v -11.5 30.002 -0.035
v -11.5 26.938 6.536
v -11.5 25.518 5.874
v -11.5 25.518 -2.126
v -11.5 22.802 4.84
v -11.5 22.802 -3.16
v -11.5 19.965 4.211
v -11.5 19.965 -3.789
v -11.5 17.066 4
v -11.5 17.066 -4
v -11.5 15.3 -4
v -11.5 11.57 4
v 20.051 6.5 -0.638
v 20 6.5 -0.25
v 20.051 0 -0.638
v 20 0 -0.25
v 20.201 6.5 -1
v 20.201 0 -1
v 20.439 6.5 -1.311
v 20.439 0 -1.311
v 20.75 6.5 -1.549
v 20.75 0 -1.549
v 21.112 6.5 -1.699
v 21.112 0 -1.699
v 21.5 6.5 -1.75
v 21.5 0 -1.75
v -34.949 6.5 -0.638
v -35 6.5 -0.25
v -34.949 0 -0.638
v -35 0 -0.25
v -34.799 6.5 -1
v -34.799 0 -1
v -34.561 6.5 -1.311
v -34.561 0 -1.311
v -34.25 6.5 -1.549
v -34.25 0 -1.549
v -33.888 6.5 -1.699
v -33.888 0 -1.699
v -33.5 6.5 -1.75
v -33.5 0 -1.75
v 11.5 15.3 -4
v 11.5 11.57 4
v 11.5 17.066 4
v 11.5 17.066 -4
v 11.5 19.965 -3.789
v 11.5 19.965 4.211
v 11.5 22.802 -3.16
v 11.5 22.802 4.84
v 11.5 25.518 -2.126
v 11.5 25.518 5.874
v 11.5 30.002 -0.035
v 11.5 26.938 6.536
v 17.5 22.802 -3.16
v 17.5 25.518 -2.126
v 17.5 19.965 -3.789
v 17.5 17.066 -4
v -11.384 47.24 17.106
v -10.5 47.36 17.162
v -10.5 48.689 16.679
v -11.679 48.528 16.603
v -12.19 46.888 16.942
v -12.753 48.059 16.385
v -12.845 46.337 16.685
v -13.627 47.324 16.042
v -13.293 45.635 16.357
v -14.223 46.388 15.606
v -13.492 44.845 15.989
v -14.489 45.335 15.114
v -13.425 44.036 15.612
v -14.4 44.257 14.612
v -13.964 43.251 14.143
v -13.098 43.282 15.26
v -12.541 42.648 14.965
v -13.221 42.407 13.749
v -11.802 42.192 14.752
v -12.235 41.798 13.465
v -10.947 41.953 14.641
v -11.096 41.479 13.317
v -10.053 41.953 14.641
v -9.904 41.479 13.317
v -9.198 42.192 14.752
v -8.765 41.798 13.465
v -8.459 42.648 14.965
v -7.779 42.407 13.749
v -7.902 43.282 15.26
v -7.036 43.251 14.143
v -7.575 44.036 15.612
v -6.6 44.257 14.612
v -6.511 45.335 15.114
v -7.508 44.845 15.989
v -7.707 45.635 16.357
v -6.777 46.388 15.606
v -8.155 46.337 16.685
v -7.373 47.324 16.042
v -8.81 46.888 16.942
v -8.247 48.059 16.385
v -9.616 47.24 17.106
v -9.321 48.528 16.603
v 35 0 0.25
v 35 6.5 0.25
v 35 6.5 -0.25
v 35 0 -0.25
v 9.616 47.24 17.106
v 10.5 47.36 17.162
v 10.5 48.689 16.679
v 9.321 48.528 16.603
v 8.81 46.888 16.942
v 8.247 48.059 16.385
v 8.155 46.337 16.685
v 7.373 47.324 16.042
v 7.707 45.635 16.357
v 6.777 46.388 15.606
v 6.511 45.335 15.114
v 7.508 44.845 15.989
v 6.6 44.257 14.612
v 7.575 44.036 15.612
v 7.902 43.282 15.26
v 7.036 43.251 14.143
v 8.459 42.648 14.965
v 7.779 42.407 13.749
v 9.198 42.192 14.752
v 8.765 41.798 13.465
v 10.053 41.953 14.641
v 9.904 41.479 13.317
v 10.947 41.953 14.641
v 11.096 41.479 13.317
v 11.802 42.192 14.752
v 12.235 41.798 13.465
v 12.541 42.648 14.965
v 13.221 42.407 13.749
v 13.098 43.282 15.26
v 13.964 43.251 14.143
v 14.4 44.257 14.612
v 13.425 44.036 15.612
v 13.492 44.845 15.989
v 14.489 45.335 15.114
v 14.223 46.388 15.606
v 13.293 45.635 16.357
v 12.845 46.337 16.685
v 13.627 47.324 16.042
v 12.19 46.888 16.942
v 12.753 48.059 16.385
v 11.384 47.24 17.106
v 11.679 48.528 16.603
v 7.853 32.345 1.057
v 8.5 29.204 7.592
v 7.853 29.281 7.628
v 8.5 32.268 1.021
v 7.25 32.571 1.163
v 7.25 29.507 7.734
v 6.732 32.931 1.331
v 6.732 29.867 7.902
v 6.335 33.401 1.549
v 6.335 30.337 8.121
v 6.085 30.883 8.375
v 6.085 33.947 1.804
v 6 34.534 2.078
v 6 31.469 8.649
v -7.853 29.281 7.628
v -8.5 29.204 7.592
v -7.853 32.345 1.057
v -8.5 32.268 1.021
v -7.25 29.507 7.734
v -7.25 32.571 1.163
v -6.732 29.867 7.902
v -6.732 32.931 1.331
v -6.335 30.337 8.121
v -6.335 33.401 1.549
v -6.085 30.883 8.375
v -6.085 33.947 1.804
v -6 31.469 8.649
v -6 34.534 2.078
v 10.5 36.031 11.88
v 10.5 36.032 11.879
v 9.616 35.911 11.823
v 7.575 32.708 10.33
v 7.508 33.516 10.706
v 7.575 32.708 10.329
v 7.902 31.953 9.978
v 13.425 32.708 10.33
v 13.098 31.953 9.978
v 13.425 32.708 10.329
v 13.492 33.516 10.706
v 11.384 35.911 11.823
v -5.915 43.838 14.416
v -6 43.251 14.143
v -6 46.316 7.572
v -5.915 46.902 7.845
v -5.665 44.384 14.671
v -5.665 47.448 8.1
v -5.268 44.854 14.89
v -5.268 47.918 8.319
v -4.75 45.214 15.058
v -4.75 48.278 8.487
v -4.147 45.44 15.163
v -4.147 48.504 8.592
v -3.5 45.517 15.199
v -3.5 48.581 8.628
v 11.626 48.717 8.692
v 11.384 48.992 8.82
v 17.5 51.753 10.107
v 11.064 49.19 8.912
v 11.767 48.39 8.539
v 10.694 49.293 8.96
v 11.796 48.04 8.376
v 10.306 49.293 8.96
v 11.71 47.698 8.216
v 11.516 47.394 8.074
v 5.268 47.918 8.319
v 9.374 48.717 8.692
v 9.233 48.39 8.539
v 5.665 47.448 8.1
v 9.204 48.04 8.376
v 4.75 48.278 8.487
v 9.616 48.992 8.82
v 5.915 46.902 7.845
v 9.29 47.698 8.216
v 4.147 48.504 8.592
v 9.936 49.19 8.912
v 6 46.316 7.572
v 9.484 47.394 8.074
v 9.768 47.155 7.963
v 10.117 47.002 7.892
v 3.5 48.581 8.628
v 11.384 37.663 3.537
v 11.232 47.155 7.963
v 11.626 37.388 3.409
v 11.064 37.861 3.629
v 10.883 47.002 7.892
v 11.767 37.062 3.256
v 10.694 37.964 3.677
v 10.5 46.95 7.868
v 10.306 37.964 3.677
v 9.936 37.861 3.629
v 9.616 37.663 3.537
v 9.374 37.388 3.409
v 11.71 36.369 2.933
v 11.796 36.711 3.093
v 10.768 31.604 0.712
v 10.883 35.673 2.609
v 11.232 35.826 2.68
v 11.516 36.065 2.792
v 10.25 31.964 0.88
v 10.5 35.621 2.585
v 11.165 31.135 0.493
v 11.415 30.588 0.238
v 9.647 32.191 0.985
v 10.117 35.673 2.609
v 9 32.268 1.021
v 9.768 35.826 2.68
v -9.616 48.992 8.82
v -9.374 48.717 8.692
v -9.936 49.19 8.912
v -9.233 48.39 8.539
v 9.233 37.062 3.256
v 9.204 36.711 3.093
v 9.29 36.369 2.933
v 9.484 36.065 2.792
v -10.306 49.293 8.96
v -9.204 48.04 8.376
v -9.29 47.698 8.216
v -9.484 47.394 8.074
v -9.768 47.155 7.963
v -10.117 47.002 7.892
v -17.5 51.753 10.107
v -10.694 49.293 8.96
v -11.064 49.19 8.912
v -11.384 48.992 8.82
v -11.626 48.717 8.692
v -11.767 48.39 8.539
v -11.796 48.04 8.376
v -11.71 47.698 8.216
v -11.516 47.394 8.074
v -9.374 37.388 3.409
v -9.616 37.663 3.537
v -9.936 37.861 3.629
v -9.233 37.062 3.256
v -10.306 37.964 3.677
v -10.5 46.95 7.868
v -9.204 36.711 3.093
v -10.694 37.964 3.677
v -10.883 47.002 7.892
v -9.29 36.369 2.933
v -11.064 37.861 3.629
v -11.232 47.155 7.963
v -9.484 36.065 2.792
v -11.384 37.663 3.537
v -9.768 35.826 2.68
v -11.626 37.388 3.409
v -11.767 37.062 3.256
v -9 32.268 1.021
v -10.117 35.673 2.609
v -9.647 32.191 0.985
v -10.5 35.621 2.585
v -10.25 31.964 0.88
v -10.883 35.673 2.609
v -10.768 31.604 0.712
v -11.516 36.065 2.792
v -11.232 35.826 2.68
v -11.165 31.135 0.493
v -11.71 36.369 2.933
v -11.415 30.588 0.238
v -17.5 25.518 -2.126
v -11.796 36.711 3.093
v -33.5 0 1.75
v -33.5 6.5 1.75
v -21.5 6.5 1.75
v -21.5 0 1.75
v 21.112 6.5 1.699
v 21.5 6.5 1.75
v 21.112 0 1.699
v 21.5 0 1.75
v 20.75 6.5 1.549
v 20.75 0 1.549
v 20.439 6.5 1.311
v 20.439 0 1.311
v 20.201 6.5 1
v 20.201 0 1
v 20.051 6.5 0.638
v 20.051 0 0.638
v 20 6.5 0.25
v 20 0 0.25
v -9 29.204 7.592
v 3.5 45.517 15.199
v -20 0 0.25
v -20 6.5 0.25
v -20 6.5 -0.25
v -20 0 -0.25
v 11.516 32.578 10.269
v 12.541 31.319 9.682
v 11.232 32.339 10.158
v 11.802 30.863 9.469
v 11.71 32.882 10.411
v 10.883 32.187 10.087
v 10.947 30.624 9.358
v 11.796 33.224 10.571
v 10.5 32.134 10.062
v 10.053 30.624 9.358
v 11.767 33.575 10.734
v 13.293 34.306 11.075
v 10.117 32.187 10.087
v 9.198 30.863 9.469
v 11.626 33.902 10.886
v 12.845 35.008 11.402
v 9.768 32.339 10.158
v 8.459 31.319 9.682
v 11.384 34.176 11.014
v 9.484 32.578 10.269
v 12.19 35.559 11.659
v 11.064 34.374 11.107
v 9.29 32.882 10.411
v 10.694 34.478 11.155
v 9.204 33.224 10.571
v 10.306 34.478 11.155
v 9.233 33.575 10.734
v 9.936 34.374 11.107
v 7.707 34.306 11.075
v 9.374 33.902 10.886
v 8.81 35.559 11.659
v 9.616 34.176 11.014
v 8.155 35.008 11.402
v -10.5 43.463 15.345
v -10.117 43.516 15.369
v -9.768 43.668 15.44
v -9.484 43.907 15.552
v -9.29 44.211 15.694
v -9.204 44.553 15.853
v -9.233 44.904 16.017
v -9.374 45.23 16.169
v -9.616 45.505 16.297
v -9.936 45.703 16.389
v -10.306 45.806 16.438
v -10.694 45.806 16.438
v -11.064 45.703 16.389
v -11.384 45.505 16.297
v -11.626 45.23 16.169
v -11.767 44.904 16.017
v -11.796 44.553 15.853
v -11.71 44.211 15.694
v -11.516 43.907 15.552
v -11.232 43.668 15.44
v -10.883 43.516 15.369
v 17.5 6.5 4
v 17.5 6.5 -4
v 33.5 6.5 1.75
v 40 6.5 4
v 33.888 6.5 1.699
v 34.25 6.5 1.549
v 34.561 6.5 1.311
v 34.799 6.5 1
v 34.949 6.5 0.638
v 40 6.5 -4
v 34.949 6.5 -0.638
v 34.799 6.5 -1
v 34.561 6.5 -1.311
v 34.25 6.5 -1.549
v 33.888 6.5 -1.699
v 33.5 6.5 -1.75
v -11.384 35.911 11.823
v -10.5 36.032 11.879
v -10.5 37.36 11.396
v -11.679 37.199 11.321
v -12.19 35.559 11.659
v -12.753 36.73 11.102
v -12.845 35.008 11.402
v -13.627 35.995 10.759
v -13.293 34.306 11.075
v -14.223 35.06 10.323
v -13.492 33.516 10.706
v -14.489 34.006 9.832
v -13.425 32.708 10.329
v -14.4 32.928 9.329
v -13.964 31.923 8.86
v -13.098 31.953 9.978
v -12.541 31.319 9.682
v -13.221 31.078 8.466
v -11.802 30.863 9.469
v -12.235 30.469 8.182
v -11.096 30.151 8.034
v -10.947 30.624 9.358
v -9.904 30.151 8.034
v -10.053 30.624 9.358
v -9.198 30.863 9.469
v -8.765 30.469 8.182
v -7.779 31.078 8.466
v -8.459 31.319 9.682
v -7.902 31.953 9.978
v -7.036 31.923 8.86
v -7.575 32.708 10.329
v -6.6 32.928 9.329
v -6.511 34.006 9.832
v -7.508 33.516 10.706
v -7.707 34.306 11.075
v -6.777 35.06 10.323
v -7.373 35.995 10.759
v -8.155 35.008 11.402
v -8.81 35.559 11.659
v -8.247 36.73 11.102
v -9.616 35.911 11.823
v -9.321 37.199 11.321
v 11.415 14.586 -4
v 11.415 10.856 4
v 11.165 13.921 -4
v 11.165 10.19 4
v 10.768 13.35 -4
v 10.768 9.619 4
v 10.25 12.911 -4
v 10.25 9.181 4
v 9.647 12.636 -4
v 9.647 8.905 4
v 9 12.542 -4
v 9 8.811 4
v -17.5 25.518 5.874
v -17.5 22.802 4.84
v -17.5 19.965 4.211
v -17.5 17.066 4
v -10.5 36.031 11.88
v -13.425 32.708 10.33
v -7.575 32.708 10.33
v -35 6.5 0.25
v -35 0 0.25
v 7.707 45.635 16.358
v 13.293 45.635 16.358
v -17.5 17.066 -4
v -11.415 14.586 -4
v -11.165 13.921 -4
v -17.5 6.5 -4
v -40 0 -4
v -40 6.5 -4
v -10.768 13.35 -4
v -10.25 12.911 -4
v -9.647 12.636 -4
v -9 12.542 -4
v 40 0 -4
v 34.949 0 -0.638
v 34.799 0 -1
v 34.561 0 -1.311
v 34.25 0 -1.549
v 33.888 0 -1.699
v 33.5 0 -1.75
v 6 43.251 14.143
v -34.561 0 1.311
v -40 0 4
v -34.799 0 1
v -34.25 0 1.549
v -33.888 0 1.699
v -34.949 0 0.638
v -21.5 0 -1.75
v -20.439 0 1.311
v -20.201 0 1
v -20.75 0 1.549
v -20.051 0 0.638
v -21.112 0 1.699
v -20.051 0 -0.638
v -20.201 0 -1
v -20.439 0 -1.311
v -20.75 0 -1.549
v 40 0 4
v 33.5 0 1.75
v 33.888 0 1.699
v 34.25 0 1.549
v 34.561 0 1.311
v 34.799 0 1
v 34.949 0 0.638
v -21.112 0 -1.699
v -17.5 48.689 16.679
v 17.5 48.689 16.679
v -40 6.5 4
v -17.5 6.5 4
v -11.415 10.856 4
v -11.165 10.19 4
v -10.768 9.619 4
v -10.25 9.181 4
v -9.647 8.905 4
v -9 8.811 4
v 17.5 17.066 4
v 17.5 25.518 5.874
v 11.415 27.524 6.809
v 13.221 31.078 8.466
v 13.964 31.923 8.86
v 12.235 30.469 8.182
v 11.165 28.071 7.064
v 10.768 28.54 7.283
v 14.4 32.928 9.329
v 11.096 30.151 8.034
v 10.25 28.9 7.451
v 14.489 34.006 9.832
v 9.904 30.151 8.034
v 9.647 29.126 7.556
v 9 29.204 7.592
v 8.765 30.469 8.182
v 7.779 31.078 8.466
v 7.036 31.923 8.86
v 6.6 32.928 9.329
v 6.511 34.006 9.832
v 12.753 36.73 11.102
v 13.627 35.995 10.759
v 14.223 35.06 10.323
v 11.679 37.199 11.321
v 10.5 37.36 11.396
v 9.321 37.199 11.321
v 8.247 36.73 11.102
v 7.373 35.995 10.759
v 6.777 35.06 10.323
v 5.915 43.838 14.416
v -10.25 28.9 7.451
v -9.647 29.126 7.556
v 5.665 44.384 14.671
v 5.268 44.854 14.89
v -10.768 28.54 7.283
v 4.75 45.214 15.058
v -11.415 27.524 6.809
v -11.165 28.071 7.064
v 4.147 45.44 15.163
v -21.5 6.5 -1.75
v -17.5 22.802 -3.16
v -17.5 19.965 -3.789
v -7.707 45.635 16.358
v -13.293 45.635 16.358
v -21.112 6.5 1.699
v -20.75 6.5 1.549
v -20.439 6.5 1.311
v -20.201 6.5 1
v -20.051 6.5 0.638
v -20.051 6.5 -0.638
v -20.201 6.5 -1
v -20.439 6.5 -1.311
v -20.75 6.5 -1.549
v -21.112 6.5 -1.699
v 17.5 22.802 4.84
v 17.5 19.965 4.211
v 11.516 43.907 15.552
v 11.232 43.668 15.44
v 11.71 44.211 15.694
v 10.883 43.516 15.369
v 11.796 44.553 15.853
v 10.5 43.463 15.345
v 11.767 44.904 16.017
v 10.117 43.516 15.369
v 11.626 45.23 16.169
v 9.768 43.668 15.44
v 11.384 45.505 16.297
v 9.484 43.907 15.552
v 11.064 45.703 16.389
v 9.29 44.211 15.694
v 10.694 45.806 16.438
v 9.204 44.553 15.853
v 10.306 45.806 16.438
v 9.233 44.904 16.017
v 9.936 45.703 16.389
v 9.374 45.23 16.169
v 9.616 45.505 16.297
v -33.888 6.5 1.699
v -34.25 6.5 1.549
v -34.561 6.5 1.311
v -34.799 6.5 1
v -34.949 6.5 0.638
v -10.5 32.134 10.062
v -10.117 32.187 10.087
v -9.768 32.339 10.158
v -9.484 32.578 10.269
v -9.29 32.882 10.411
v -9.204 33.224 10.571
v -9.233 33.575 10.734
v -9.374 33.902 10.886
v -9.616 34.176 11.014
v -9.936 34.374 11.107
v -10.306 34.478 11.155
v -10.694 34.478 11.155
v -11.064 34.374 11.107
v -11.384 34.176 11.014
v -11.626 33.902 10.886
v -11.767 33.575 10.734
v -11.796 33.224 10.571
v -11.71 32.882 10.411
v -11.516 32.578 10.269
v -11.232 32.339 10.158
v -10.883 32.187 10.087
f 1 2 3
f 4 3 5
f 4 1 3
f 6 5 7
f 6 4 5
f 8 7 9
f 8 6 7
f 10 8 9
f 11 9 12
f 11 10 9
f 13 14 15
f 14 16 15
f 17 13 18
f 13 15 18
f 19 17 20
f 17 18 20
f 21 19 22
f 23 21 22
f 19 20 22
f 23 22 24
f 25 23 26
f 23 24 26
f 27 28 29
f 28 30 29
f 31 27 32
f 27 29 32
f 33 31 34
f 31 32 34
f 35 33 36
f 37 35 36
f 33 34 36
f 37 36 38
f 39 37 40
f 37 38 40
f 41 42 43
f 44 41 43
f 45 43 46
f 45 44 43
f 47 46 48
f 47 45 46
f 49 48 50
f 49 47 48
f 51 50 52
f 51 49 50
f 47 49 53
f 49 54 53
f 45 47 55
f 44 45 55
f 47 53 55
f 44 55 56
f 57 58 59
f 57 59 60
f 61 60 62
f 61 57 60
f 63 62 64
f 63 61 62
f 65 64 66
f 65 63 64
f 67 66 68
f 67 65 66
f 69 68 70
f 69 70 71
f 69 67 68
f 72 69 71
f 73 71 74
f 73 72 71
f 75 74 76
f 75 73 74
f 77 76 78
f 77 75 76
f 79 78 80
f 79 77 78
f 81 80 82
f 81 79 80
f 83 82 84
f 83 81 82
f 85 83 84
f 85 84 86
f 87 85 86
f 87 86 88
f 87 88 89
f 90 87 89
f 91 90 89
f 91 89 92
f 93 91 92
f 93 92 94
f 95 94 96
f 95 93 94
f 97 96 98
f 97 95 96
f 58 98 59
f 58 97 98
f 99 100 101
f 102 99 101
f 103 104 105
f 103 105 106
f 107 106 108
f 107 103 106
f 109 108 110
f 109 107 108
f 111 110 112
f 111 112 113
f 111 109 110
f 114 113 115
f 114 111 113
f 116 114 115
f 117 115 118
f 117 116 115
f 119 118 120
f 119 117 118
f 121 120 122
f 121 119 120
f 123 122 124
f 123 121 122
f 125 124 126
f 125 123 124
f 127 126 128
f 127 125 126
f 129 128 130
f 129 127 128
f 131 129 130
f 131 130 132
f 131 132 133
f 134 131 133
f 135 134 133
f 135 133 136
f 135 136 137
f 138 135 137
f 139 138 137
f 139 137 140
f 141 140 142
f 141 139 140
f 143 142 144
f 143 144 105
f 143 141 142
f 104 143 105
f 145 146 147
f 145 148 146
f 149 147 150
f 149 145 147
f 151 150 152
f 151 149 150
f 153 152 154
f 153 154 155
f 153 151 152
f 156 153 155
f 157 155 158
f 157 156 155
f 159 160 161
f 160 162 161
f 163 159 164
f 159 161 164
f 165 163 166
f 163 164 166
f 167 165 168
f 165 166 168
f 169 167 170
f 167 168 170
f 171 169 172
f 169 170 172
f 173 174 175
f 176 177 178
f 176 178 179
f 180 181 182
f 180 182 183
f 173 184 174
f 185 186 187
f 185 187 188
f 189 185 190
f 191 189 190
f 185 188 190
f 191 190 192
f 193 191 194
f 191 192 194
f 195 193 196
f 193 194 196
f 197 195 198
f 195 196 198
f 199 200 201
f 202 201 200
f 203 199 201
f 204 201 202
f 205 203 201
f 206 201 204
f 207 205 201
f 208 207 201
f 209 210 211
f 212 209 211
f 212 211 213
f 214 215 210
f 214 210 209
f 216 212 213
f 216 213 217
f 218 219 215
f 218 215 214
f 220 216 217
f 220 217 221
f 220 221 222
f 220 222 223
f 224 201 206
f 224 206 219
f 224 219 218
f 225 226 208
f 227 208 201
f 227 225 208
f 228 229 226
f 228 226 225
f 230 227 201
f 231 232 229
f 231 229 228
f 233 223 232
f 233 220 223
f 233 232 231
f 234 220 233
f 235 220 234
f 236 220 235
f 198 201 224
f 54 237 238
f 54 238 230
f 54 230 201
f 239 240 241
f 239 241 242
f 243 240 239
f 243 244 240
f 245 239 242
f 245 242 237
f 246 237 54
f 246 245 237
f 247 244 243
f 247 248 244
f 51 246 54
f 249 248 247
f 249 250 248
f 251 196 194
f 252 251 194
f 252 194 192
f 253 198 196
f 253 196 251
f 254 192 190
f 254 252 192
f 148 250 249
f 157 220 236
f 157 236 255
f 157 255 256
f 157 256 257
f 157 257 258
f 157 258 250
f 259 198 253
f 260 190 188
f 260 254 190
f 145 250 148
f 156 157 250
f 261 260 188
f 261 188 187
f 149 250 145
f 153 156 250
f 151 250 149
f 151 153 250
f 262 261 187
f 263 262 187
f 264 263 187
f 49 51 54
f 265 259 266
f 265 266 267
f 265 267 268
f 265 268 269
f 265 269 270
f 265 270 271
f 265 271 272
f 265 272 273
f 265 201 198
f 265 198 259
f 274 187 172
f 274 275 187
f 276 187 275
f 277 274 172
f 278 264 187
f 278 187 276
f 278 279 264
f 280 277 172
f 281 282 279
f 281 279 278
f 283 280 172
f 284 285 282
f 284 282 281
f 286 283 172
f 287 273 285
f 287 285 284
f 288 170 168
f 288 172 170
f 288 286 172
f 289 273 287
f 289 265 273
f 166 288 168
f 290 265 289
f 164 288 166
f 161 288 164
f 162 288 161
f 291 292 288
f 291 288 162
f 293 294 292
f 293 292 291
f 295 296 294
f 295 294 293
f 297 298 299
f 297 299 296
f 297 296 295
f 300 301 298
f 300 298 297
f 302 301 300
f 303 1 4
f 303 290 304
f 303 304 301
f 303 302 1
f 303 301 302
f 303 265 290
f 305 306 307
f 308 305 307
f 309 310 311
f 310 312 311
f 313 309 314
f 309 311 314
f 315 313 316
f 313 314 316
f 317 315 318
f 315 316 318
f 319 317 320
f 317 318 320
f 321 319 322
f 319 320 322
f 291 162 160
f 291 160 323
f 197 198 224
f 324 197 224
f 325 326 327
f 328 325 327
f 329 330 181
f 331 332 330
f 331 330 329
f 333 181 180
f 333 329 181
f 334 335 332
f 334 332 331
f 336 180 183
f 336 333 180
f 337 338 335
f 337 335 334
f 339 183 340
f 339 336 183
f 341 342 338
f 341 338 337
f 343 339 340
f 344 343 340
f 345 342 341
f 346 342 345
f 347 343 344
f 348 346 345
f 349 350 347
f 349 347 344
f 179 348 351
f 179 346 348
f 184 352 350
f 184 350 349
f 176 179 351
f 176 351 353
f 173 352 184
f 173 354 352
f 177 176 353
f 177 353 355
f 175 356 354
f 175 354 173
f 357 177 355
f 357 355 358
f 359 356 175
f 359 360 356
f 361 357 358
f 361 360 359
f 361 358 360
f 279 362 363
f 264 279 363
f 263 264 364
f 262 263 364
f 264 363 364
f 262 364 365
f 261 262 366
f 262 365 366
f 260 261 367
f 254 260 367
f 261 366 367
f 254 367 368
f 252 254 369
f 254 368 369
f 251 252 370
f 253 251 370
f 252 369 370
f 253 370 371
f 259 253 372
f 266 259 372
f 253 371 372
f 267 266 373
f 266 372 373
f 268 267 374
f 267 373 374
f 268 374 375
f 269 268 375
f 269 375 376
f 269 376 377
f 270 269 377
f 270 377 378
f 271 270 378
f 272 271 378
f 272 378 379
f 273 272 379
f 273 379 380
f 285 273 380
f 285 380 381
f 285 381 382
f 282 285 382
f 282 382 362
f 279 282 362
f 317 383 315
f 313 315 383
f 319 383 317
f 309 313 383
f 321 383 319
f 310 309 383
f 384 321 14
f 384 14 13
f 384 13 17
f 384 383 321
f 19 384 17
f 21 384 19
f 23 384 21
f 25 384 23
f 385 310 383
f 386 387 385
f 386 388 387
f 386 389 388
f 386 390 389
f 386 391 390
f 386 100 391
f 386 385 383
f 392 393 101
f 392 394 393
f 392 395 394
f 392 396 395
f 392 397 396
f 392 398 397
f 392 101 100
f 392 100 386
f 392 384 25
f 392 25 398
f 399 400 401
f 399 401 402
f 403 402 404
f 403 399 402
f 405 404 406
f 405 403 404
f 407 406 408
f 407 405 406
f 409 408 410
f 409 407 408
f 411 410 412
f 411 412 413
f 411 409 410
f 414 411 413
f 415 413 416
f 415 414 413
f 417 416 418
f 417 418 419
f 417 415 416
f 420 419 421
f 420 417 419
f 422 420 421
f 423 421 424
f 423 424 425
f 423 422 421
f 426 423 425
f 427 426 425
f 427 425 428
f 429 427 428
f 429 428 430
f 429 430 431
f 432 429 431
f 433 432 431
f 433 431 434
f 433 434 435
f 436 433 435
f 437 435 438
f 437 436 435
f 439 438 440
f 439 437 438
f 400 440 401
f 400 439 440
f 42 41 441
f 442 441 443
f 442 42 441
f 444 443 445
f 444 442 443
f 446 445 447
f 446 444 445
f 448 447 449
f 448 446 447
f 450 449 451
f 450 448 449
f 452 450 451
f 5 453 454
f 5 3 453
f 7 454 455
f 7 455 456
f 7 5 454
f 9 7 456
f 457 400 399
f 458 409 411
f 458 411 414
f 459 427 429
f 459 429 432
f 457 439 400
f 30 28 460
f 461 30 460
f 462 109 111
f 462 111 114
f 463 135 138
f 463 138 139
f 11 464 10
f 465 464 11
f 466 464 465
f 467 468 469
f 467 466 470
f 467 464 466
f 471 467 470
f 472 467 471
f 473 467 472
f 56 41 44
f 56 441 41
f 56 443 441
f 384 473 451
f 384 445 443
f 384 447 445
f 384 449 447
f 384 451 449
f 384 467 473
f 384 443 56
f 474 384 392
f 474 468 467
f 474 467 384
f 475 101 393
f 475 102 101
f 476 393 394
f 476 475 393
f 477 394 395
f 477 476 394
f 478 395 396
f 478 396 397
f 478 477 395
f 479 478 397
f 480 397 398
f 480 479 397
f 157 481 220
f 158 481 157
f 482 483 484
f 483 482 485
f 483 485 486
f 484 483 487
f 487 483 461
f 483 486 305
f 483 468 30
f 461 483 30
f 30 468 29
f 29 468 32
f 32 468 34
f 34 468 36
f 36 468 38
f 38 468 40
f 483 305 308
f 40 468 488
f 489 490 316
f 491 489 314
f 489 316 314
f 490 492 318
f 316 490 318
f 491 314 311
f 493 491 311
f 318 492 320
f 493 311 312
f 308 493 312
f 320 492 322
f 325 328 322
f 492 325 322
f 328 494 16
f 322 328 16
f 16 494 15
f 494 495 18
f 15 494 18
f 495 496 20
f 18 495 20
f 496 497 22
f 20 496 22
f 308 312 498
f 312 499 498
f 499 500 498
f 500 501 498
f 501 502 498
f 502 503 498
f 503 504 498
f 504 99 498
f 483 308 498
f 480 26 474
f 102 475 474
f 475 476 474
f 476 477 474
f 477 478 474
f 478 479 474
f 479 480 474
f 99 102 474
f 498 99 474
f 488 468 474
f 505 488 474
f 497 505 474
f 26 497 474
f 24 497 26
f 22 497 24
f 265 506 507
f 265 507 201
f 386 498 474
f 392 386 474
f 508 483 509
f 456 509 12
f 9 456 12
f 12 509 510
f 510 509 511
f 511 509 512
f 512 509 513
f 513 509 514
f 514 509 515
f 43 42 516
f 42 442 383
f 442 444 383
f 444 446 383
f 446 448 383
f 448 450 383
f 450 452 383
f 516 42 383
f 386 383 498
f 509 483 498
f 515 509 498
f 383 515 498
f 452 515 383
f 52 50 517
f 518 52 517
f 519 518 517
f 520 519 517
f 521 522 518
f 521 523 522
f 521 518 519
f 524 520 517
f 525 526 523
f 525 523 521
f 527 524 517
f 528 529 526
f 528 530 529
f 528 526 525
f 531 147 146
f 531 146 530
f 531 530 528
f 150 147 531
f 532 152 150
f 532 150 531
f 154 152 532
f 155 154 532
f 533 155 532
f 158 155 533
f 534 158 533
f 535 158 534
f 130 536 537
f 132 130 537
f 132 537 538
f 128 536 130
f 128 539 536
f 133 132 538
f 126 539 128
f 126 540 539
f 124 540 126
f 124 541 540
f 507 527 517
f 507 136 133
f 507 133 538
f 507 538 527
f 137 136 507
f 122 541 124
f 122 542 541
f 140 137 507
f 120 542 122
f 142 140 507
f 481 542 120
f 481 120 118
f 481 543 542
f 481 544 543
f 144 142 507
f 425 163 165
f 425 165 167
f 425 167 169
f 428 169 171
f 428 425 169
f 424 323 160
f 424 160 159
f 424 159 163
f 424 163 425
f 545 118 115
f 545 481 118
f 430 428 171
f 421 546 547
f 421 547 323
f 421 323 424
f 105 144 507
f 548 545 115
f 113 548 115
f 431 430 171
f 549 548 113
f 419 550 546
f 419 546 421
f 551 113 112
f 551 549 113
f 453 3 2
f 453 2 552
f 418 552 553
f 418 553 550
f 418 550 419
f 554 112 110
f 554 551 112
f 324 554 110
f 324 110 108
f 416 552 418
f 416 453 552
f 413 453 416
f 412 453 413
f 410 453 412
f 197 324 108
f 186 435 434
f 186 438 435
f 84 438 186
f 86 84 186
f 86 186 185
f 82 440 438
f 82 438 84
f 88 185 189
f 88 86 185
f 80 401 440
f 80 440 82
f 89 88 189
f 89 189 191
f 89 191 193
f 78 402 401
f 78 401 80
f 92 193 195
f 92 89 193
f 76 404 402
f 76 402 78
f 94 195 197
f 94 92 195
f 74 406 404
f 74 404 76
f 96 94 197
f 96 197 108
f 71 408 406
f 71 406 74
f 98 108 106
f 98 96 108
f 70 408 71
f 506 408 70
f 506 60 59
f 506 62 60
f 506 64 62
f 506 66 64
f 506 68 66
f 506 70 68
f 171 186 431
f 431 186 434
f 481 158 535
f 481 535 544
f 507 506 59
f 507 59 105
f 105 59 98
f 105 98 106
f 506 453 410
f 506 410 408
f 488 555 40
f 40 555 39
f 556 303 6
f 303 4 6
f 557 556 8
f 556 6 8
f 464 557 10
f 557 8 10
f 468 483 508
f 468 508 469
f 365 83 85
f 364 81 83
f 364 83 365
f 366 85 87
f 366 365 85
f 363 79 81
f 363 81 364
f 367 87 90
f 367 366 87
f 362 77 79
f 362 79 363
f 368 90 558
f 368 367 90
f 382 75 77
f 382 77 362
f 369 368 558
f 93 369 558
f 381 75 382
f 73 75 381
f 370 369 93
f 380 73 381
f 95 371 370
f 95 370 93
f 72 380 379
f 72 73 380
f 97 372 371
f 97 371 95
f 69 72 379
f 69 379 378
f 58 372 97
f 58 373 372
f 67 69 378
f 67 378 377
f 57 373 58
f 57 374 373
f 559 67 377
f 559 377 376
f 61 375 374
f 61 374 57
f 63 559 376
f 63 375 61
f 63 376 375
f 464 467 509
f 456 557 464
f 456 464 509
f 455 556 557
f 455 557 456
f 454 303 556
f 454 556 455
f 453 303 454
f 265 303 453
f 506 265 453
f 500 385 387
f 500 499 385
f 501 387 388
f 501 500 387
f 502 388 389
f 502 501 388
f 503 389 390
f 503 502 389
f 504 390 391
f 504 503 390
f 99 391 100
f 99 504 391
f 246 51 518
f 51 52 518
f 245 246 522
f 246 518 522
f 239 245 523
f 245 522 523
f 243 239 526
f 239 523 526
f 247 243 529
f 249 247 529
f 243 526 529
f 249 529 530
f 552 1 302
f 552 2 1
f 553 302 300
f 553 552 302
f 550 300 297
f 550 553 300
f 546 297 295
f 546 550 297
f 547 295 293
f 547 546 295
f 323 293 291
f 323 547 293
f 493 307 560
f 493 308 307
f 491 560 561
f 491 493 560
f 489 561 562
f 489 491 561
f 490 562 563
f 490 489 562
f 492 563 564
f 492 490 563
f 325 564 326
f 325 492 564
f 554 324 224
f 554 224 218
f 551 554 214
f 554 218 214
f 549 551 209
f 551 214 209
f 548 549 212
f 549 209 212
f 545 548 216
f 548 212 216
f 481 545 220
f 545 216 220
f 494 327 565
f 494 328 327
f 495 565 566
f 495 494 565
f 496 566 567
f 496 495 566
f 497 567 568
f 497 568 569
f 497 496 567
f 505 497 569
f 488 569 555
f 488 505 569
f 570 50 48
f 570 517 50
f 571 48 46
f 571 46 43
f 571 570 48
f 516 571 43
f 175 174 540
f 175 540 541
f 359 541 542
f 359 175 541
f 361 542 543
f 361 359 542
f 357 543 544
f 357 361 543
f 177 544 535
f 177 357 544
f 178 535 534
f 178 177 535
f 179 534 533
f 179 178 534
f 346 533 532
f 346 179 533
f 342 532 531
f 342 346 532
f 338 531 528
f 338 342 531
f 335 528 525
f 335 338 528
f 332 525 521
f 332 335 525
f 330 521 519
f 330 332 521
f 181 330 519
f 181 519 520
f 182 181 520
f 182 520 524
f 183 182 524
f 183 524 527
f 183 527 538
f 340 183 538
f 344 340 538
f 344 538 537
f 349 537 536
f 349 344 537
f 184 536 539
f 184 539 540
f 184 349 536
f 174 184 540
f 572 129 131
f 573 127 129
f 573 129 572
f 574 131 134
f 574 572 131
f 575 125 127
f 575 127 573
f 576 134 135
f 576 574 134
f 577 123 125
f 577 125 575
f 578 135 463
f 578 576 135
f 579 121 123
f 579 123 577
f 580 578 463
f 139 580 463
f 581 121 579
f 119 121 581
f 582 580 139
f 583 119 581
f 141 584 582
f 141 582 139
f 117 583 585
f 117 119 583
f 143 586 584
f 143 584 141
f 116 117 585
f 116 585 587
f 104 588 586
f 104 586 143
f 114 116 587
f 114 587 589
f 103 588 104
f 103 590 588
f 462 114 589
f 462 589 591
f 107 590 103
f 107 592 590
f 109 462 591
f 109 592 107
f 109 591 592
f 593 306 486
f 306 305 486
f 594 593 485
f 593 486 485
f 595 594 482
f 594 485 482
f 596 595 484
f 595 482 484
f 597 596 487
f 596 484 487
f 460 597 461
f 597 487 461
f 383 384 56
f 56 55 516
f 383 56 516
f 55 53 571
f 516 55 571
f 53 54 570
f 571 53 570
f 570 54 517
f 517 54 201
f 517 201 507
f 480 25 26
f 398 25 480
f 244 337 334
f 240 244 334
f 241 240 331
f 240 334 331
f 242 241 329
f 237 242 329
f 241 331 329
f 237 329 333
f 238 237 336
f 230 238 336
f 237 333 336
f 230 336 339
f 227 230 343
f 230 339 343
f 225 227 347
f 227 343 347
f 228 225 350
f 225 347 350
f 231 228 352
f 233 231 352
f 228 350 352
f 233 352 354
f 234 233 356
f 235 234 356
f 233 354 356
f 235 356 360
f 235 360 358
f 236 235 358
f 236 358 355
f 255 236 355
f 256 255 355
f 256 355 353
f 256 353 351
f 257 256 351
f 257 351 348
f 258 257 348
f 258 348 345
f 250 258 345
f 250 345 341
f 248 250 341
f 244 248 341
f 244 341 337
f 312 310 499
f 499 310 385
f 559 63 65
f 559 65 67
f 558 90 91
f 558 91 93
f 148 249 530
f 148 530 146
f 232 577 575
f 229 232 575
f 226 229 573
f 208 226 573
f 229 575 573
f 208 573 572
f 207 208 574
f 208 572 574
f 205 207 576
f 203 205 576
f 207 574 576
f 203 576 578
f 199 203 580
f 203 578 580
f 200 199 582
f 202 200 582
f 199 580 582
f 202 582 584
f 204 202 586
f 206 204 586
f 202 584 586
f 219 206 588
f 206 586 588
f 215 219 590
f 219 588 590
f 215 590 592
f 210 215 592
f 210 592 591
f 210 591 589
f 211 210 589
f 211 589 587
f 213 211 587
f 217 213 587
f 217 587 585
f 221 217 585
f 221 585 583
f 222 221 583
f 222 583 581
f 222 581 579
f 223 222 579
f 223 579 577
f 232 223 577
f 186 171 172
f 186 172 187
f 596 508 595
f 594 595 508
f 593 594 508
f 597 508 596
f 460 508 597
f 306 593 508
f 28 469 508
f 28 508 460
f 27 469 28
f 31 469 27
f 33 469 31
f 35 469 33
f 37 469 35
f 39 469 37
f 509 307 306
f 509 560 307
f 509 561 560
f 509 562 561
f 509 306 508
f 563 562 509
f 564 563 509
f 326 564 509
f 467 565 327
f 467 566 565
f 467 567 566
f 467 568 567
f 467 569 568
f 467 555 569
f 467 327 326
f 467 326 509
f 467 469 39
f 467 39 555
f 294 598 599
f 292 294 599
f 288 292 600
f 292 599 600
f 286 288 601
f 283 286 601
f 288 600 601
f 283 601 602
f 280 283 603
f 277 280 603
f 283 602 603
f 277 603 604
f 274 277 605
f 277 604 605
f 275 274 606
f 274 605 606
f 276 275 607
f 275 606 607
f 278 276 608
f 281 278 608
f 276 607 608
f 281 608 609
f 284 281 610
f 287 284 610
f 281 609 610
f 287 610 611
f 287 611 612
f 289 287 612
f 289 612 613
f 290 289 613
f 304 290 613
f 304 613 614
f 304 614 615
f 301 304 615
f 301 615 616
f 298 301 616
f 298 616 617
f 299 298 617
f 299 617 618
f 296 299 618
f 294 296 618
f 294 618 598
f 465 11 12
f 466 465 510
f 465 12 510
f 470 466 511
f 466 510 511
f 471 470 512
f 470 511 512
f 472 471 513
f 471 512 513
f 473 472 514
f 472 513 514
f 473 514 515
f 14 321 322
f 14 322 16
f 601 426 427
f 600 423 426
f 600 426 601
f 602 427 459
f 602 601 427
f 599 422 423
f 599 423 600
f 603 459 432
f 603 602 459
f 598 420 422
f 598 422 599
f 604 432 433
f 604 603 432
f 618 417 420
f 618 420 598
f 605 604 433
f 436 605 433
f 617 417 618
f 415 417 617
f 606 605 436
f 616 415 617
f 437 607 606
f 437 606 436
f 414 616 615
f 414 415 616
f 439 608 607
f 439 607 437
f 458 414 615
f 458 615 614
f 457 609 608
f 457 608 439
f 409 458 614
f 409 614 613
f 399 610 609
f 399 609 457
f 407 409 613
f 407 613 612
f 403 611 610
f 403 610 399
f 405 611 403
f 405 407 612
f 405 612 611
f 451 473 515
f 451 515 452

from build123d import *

# Parameters (mm, degrees)
SKETCH13_W              = 80
SKETCH13_H              = 8
BOSS_EXTRUDE9_DEPTH     = 6.5
SKETCH14_W              = 15
SKETCH14_H              = 3.4999999999999996
CUT_EXTRUDE1_DEPTH      = 41.72161588149469
SKETCH15_W              = 35
SKETCH15_H              = 8
BOSS_EXTRUDE10_DEPTH    = 15
BOSS_EXTRUDE11_DEPTH    = 35
SKETCH17_R              = 3.0000000000000036
SKETCH17_R_2            = 3
BOSS_EXTRUDE12_DEPTH    = 1
SKETCH20_R              = 1.3000000000000023
CUT_EXTRUDE2_DEPTH      = 68.35348577458582
CUT_EXTRUDE3_DEPTH      = 68.33334117794962
CUT_EXTRUDE3_DEPTH_BACK = 68.33334117794962
CUT_EXTRUDE4_DEPTH      = 68.3333411779496
FILLET2_R               = 1.5
CHAMFER1_SIZE           = 1
FILLET3_R               = 20
FILLET4_R               = 2.5


with BuildPart() as part:
    # Sketch13 → Boss-Extrude9 (new body)
    with BuildSketch(Plane(origin=(0, 0, 0), x_dir=(1, 0, 0), z_dir=(0, 1, 0))):
        Rectangle(SKETCH13_W, SKETCH13_H)
    extrude(amount=BOSS_EXTRUDE9_DEPTH)

    # Sketch14 → Cut-Extrude1 (cut, through all)
    with BuildSketch(Plane(origin=(0, 6.5, 0), x_dir=(1, 0, 0), z_dir=(0, 1, 0))):
        Polygon((-35, -1.75), (-20, -1.7499999999999998), (-20, 1.7499999999999998), (-35, 1.75), align=None)
        with Locations((27.5, 0)):
            Rectangle(SKETCH14_W, SKETCH14_H)
    extrude(amount=-CUT_EXTRUDE1_DEPTH, mode=Mode.SUBTRACT)

    # Sketch15 → Boss-Extrude10 (add)
    with BuildSketch(Plane(origin=(0, 6.5, 0), x_dir=(1, 0, 0), z_dir=(0, 1, 0))):
        Rectangle(SKETCH15_W, SKETCH15_H)
    extrude(amount=BOSS_EXTRUDE10_DEPTH)

    # Sketch16 → Boss-Extrude11 (add)
    with BuildSketch(Plane.ZY.offset(17.5)):
        Polygon((4, 21.5), (16.678547852220913, 48.689233611099525), (10.107397413474738, 51.75341138357542), (-4, 21.5), align=None)
    extrude(amount=-BOSS_EXTRUDE11_DEPTH)

    # Sketch17 → Boss-Extrude12 (add)
    with BuildSketch(Plane(origin=(0, 2.307944309631712, -4.949402544155895), x_dir=(1, 0, 0), z_dir=(0, -0.42261826174069717, 0.9063077870366509))):
        with Locations(Location((-10.500000000000005, 47.17609046825079, 0), (0, 0, 90))):
            Circle(SKETCH17_R)
        with Locations(Location((10.499999999999995, 47.17609046825079, 0), (0, 0, 90))):
            Circle(SKETCH17_R_2)
        with Locations(Location((10.499999999999995, 34.67609046825079, 0), (0, 0, 90))):
            Circle(SKETCH17_R_2)
        with Locations(Location((-10.500000000000005, 34.67609046825079, 0), (0, 0, 90))):
            Circle(SKETCH17_R)
    extrude(amount=BOSS_EXTRUDE12_DEPTH)

    # Sketch20 → Cut-Extrude2 (cut, through all)
    with BuildSketch(Plane(origin=(0, 1.885326047891013, -4.043094757119239), x_dir=(1, 0, 0), z_dir=(0, -0.4226182617406972, 0.906307787036651))):
        with Locations(Location((-10.500000000000005, 47.176090468250806, 0), (0, 0, 270))):
            Circle(SKETCH20_R)
        with Locations(Location((10.499999999999995, 47.176090468250806, 0), (0, 0, 270))):
            Circle(SKETCH20_R)
        with Locations(Location((10.499999999999995, 34.67609046825079, 0), (0, 0, 270))):
            Circle(SKETCH20_R)
        with Locations(Location((-10.500000000000005, 34.67609046825079, 0), (0, 0, 270))):
            Circle(SKETCH20_R)
    extrude(amount=-CUT_EXTRUDE2_DEPTH, mode=Mode.SUBTRACT)

    # Sketch21 → Cut-Extrude3 (cut, two sides: drawn at the far end of the back side and taken through both)
    with BuildSketch(Plane(origin=(0, 2.307944309631711, -4.949402544155892), x_dir=(1, 0, 0), z_dir=(0, -0.4226182617406972, 0.906307787036651)).offset(-CUT_EXTRUDE3_DEPTH_BACK)):
        Polygon((-11.500000000000002, 9.676090468250791), (11.499999999999998, 9.676090468250791), (11.499999999999995, 29.67609046825079), (-11.500000000000002, 29.67609046825079), align=None)
    extrude(amount=CUT_EXTRUDE3_DEPTH + CUT_EXTRUDE3_DEPTH_BACK, mode=Mode.SUBTRACT)

    # Sketch22 → Cut-Extrude4 (cut, through all)
    with BuildSketch(Plane(origin=(0, 2.307944309631712, -4.949402544155895), x_dir=(1, 0, 0), z_dir=(0, -0.42261826174069717, 0.9063077870366509))):
        Polygon((-6.000000000000002, 47.676090468250806), (6.000000000000002, 47.676090468250806), (6, 29.676090468250802), (-6, 29.676090468250802), align=None)
    extrude(amount=-CUT_EXTRUDE4_DEPTH, mode=Mode.SUBTRACT)

    # Fillet2
    fillet2_edges = [part.edges().sort_by_distance(p)[0] for p in [
        (-20, 3.25, -1.7499999999999998),
        (-20, 3.25, 1.7499999999999998),
        (-35, 3.25, 1.75),
        (-35, 3.25, -1.75),
        (35, 3.25, -1.7499999999999998),
        (35, 3.25, 1.7499999999999998),
        (20, 3.25, 1.7499999999999998),
        (20, 3.25, -1.7499999999999998),
    ]]
    fillet(fillet2_edges, radius=FILLET2_R)

    # Chamfer1
    chamfer1_edges = [part.edges().sort_by_distance(p)[0] for p in [
        (10.499999999999995, 42.345079101842984, 13.720220020036038),
        (10.499999999999995, 31.016231763884843, 8.437491748277322),
        (-10.500000000000005, 42.345079101842984, 13.720220020036038),
        (-10.500000000000005, 31.01623176388484, 8.43749174827732),
    ]]
    chamfer(chamfer1_edges, length=CHAMFER1_SIZE - 0.0001)  # a hair under: the kernel refuses the full size

    # Fillet3
    fillet3_edges = [part.edges().sort_by_distance(p)[0] for p in [
        (14.5, 21.5, 4),
        (-14.5, 21.5, -4),
        (14.499999999999998, 21.5, -4),
        (-14.5, 21.5, 4),
    ]]
    fillet(fillet3_edges, radius=FILLET3_R)

    # Fillet4
    fillet4_edges = [part.edges().sort_by_distance(p)[0] for p in [
        (11.499999999999998, 10.676384564551352, 0),
        (11.499999999999995, 30.735705076049488, 4.306680005422848),
        (-11.500000000000002, 10.676384564551352, -7.11e-15),
        (-11.500000000000002, 30.735705076049495, 4.306680005422834),
        (-6, 30.7357050760495, 4.306680005422846),
        (6, 30.7357050760495, 4.306680005422846),
        (6.000000000000002, 47.049245242709226, 11.913808716755398),
        (-6.000000000000002, 47.049245242709226, 11.913808716755398),
    ]]
    fillet(fillet4_edges, radius=FILLET4_R)


solid = part.part
